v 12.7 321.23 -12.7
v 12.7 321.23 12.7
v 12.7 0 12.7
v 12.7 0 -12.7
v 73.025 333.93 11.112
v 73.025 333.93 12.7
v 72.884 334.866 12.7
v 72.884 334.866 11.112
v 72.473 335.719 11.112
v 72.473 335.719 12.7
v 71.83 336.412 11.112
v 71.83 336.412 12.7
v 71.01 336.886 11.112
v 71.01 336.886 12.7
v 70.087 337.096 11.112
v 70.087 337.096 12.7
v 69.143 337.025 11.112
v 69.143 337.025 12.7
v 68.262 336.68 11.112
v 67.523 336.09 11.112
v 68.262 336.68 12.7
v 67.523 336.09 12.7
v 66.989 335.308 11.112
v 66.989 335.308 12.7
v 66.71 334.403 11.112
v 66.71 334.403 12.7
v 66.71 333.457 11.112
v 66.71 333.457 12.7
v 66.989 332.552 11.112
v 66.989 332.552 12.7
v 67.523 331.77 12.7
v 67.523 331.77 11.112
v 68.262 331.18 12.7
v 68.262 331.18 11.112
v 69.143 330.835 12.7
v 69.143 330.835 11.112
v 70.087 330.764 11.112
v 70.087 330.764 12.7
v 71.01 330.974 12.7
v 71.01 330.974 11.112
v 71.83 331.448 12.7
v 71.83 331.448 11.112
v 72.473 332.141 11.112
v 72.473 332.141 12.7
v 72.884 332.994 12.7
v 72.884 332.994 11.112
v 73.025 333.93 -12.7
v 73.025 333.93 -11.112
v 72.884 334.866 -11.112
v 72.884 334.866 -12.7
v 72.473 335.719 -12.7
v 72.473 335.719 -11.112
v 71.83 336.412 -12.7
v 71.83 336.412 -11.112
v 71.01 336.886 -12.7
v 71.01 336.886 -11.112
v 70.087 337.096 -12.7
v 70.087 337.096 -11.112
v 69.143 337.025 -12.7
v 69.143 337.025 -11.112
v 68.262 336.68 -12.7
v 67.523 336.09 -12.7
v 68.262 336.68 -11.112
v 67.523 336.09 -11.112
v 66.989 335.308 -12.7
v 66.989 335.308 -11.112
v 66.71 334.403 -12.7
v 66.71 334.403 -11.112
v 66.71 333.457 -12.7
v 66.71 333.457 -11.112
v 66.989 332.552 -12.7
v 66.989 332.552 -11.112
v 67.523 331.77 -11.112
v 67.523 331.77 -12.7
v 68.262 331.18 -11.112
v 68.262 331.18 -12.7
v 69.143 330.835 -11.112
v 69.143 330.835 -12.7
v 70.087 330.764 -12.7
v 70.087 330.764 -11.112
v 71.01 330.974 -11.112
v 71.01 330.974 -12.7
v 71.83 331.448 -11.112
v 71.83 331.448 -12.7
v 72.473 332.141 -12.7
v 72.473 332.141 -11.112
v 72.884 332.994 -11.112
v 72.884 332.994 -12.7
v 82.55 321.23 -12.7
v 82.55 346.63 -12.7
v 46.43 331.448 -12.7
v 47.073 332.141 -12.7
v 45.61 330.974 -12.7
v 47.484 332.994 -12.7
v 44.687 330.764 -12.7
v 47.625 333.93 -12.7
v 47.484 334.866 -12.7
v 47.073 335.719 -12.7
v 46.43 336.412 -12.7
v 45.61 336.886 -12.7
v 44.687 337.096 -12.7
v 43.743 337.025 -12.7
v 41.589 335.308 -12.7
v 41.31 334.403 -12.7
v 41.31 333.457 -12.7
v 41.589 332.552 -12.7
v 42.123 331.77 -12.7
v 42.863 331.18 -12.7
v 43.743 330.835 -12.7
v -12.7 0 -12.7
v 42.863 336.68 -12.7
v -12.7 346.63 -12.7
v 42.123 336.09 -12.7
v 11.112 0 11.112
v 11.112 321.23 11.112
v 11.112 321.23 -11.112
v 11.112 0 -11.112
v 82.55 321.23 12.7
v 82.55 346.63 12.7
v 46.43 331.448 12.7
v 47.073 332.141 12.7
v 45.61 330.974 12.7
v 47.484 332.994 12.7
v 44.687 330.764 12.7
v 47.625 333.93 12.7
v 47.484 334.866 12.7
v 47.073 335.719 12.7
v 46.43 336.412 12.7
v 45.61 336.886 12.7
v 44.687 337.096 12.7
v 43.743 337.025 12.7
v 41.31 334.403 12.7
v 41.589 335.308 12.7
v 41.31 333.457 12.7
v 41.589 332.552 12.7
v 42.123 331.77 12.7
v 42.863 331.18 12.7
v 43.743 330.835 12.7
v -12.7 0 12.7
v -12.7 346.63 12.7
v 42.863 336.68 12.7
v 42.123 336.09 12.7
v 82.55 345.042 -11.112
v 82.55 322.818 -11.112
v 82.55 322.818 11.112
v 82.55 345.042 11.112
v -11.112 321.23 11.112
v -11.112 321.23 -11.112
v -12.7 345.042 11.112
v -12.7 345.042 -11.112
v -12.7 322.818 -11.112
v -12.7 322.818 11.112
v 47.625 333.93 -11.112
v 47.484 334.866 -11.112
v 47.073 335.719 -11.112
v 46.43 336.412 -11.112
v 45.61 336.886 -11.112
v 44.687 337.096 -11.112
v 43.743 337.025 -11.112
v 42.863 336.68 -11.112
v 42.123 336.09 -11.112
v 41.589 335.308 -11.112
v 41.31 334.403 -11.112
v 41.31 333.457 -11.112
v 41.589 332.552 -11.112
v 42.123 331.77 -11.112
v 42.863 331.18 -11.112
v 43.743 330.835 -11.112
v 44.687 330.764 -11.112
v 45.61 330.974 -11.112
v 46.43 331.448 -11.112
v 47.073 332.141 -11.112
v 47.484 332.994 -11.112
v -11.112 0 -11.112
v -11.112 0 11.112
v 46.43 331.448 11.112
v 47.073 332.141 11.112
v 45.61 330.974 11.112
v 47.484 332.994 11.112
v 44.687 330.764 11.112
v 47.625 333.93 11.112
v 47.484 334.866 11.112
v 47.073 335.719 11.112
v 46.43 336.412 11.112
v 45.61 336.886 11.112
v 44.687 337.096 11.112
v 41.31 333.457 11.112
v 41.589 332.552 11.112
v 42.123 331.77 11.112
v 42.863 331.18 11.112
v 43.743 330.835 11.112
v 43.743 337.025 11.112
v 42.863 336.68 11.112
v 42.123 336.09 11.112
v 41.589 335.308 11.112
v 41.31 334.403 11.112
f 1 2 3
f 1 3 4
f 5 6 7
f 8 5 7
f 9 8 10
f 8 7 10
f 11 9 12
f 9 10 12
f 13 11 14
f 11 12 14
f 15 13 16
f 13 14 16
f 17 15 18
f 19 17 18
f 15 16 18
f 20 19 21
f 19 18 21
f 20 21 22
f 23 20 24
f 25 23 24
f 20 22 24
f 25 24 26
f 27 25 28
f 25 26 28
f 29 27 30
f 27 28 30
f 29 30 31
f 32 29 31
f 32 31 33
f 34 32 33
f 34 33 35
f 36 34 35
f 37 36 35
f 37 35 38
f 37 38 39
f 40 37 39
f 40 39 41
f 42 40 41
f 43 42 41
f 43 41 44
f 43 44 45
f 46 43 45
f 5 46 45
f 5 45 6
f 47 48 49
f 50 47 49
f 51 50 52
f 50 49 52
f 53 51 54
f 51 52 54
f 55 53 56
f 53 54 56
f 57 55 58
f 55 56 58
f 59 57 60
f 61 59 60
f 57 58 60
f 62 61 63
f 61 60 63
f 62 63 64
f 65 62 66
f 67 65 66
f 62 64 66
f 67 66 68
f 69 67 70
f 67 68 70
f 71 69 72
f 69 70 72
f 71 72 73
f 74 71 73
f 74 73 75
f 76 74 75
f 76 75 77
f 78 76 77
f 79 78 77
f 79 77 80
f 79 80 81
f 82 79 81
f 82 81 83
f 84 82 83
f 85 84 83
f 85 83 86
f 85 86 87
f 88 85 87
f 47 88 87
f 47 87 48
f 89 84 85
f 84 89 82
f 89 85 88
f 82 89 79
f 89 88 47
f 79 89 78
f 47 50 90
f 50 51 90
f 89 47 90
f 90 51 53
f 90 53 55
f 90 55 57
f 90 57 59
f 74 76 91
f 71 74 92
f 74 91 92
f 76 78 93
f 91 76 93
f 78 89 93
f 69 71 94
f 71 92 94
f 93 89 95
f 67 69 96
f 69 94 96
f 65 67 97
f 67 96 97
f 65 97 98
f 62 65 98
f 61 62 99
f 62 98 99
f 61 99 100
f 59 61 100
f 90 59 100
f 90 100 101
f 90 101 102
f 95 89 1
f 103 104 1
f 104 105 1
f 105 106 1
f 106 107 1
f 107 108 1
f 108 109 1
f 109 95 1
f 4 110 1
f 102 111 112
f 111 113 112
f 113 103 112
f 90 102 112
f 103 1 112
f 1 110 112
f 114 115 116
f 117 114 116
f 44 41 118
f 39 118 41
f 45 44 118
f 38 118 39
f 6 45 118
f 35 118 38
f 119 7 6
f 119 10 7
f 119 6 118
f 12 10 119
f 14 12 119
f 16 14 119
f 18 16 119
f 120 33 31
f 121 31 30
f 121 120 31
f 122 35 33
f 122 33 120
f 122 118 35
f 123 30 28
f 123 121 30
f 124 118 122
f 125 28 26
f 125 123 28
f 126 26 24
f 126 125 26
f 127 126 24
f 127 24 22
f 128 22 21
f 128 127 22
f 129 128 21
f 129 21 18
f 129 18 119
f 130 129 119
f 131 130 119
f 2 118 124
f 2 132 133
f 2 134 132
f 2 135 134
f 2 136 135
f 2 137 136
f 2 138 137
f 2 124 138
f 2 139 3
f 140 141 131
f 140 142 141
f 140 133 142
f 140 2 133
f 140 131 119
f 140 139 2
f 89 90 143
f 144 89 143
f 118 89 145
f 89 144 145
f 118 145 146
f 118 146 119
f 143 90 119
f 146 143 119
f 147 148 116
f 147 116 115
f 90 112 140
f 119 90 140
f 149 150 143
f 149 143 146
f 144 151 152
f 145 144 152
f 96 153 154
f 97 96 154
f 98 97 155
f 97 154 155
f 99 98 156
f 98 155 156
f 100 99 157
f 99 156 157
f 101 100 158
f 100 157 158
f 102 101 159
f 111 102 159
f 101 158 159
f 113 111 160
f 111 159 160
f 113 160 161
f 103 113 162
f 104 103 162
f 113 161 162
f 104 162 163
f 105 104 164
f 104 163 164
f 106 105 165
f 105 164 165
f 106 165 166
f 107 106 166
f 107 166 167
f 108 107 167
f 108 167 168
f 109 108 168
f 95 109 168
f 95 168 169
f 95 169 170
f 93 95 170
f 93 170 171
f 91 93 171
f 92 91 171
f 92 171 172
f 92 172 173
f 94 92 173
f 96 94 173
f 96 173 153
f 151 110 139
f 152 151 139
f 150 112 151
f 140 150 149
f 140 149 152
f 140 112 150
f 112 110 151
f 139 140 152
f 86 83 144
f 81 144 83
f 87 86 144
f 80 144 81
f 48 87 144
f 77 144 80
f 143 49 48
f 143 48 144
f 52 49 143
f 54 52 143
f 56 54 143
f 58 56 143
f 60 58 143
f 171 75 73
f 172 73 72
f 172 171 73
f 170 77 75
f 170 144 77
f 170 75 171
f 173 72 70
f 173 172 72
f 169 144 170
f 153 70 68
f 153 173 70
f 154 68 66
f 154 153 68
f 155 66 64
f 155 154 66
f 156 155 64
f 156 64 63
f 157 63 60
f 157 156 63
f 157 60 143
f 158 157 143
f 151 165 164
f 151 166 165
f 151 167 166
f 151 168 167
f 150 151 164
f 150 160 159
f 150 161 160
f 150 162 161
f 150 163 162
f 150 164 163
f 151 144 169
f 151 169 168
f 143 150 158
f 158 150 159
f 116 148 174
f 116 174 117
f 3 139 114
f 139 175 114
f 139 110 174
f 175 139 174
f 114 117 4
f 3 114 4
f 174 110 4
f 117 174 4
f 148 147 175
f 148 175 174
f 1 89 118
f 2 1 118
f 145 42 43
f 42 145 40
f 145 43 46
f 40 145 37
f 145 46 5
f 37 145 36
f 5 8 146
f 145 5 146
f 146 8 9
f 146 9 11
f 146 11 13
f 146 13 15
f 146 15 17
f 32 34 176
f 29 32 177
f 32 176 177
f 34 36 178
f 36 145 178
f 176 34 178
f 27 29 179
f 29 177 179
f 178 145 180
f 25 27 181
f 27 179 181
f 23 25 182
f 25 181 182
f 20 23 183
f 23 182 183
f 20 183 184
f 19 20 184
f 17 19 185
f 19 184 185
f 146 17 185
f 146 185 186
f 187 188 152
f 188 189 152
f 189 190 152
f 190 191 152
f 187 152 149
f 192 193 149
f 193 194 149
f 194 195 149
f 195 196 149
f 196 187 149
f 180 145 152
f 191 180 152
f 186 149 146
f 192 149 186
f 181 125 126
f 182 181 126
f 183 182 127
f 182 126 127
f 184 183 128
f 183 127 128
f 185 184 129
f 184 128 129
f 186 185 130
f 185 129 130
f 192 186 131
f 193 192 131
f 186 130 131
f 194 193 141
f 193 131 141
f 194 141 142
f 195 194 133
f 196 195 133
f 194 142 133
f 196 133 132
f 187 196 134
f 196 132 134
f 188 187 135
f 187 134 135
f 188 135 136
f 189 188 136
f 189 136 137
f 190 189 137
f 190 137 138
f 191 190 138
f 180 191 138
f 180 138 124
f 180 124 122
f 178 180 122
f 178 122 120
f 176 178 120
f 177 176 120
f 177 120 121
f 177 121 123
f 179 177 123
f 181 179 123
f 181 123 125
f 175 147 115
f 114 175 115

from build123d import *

# Parameters (mm, degrees)
SKETCH1_W           = 25.4
SKETCH1_H           = 25.4
SKETCH1_W_2         = 22.225
SKETCH1_H_2         = 22.225
BOSS_EXTRUDE1_DEPTH = 321.23
SKETCH2_W           = 25.4
SKETCH2_H           = 25.4
SKETCH2_W_2         = 22.225
SKETCH2_H_2         = 22.225
BOSS_EXTRUDE2_DEPTH = 95.25
SKETCH3_R           = 3.175
CUT_EXTRUDE1_DEPTH  = 358.228245524


with BuildPart() as part:
    # Sketch1 → Boss-Extrude1 (new body)
    with BuildSketch(Plane(origin=(0, 0, 0), x_dir=(1, 0, 0), z_dir=(0, 1, 0))):
        Rectangle(SKETCH1_W, SKETCH1_H)
        Rectangle(SKETCH1_W_2, SKETCH1_H_2, mode=Mode.SUBTRACT)
    extrude(amount=BOSS_EXTRUDE1_DEPTH)

    # Sketch2 → Boss-Extrude2 (add)
    with BuildSketch(Plane.ZY.offset(12.7)):
        with Locations((0, 333.93)):
            Rectangle(SKETCH2_W, SKETCH2_H)
        with Locations((0, 333.93)):
            Rectangle(SKETCH2_W_2, SKETCH2_H_2, mode=Mode.SUBTRACT)
    extrude(amount=-BOSS_EXTRUDE2_DEPTH)

    # Sketch3 → Cut-Extrude1 (cut, through all)
    with BuildSketch(Plane.XY.offset(12.7)):
        with Locations((44.45, 333.93)):
            Circle(SKETCH3_R)
        with Locations((69.85, 333.93)):
            Circle(SKETCH3_R)
    extrude(amount=-CUT_EXTRUDE1_DEPTH, mode=Mode.SUBTRACT)


solid = part.part
